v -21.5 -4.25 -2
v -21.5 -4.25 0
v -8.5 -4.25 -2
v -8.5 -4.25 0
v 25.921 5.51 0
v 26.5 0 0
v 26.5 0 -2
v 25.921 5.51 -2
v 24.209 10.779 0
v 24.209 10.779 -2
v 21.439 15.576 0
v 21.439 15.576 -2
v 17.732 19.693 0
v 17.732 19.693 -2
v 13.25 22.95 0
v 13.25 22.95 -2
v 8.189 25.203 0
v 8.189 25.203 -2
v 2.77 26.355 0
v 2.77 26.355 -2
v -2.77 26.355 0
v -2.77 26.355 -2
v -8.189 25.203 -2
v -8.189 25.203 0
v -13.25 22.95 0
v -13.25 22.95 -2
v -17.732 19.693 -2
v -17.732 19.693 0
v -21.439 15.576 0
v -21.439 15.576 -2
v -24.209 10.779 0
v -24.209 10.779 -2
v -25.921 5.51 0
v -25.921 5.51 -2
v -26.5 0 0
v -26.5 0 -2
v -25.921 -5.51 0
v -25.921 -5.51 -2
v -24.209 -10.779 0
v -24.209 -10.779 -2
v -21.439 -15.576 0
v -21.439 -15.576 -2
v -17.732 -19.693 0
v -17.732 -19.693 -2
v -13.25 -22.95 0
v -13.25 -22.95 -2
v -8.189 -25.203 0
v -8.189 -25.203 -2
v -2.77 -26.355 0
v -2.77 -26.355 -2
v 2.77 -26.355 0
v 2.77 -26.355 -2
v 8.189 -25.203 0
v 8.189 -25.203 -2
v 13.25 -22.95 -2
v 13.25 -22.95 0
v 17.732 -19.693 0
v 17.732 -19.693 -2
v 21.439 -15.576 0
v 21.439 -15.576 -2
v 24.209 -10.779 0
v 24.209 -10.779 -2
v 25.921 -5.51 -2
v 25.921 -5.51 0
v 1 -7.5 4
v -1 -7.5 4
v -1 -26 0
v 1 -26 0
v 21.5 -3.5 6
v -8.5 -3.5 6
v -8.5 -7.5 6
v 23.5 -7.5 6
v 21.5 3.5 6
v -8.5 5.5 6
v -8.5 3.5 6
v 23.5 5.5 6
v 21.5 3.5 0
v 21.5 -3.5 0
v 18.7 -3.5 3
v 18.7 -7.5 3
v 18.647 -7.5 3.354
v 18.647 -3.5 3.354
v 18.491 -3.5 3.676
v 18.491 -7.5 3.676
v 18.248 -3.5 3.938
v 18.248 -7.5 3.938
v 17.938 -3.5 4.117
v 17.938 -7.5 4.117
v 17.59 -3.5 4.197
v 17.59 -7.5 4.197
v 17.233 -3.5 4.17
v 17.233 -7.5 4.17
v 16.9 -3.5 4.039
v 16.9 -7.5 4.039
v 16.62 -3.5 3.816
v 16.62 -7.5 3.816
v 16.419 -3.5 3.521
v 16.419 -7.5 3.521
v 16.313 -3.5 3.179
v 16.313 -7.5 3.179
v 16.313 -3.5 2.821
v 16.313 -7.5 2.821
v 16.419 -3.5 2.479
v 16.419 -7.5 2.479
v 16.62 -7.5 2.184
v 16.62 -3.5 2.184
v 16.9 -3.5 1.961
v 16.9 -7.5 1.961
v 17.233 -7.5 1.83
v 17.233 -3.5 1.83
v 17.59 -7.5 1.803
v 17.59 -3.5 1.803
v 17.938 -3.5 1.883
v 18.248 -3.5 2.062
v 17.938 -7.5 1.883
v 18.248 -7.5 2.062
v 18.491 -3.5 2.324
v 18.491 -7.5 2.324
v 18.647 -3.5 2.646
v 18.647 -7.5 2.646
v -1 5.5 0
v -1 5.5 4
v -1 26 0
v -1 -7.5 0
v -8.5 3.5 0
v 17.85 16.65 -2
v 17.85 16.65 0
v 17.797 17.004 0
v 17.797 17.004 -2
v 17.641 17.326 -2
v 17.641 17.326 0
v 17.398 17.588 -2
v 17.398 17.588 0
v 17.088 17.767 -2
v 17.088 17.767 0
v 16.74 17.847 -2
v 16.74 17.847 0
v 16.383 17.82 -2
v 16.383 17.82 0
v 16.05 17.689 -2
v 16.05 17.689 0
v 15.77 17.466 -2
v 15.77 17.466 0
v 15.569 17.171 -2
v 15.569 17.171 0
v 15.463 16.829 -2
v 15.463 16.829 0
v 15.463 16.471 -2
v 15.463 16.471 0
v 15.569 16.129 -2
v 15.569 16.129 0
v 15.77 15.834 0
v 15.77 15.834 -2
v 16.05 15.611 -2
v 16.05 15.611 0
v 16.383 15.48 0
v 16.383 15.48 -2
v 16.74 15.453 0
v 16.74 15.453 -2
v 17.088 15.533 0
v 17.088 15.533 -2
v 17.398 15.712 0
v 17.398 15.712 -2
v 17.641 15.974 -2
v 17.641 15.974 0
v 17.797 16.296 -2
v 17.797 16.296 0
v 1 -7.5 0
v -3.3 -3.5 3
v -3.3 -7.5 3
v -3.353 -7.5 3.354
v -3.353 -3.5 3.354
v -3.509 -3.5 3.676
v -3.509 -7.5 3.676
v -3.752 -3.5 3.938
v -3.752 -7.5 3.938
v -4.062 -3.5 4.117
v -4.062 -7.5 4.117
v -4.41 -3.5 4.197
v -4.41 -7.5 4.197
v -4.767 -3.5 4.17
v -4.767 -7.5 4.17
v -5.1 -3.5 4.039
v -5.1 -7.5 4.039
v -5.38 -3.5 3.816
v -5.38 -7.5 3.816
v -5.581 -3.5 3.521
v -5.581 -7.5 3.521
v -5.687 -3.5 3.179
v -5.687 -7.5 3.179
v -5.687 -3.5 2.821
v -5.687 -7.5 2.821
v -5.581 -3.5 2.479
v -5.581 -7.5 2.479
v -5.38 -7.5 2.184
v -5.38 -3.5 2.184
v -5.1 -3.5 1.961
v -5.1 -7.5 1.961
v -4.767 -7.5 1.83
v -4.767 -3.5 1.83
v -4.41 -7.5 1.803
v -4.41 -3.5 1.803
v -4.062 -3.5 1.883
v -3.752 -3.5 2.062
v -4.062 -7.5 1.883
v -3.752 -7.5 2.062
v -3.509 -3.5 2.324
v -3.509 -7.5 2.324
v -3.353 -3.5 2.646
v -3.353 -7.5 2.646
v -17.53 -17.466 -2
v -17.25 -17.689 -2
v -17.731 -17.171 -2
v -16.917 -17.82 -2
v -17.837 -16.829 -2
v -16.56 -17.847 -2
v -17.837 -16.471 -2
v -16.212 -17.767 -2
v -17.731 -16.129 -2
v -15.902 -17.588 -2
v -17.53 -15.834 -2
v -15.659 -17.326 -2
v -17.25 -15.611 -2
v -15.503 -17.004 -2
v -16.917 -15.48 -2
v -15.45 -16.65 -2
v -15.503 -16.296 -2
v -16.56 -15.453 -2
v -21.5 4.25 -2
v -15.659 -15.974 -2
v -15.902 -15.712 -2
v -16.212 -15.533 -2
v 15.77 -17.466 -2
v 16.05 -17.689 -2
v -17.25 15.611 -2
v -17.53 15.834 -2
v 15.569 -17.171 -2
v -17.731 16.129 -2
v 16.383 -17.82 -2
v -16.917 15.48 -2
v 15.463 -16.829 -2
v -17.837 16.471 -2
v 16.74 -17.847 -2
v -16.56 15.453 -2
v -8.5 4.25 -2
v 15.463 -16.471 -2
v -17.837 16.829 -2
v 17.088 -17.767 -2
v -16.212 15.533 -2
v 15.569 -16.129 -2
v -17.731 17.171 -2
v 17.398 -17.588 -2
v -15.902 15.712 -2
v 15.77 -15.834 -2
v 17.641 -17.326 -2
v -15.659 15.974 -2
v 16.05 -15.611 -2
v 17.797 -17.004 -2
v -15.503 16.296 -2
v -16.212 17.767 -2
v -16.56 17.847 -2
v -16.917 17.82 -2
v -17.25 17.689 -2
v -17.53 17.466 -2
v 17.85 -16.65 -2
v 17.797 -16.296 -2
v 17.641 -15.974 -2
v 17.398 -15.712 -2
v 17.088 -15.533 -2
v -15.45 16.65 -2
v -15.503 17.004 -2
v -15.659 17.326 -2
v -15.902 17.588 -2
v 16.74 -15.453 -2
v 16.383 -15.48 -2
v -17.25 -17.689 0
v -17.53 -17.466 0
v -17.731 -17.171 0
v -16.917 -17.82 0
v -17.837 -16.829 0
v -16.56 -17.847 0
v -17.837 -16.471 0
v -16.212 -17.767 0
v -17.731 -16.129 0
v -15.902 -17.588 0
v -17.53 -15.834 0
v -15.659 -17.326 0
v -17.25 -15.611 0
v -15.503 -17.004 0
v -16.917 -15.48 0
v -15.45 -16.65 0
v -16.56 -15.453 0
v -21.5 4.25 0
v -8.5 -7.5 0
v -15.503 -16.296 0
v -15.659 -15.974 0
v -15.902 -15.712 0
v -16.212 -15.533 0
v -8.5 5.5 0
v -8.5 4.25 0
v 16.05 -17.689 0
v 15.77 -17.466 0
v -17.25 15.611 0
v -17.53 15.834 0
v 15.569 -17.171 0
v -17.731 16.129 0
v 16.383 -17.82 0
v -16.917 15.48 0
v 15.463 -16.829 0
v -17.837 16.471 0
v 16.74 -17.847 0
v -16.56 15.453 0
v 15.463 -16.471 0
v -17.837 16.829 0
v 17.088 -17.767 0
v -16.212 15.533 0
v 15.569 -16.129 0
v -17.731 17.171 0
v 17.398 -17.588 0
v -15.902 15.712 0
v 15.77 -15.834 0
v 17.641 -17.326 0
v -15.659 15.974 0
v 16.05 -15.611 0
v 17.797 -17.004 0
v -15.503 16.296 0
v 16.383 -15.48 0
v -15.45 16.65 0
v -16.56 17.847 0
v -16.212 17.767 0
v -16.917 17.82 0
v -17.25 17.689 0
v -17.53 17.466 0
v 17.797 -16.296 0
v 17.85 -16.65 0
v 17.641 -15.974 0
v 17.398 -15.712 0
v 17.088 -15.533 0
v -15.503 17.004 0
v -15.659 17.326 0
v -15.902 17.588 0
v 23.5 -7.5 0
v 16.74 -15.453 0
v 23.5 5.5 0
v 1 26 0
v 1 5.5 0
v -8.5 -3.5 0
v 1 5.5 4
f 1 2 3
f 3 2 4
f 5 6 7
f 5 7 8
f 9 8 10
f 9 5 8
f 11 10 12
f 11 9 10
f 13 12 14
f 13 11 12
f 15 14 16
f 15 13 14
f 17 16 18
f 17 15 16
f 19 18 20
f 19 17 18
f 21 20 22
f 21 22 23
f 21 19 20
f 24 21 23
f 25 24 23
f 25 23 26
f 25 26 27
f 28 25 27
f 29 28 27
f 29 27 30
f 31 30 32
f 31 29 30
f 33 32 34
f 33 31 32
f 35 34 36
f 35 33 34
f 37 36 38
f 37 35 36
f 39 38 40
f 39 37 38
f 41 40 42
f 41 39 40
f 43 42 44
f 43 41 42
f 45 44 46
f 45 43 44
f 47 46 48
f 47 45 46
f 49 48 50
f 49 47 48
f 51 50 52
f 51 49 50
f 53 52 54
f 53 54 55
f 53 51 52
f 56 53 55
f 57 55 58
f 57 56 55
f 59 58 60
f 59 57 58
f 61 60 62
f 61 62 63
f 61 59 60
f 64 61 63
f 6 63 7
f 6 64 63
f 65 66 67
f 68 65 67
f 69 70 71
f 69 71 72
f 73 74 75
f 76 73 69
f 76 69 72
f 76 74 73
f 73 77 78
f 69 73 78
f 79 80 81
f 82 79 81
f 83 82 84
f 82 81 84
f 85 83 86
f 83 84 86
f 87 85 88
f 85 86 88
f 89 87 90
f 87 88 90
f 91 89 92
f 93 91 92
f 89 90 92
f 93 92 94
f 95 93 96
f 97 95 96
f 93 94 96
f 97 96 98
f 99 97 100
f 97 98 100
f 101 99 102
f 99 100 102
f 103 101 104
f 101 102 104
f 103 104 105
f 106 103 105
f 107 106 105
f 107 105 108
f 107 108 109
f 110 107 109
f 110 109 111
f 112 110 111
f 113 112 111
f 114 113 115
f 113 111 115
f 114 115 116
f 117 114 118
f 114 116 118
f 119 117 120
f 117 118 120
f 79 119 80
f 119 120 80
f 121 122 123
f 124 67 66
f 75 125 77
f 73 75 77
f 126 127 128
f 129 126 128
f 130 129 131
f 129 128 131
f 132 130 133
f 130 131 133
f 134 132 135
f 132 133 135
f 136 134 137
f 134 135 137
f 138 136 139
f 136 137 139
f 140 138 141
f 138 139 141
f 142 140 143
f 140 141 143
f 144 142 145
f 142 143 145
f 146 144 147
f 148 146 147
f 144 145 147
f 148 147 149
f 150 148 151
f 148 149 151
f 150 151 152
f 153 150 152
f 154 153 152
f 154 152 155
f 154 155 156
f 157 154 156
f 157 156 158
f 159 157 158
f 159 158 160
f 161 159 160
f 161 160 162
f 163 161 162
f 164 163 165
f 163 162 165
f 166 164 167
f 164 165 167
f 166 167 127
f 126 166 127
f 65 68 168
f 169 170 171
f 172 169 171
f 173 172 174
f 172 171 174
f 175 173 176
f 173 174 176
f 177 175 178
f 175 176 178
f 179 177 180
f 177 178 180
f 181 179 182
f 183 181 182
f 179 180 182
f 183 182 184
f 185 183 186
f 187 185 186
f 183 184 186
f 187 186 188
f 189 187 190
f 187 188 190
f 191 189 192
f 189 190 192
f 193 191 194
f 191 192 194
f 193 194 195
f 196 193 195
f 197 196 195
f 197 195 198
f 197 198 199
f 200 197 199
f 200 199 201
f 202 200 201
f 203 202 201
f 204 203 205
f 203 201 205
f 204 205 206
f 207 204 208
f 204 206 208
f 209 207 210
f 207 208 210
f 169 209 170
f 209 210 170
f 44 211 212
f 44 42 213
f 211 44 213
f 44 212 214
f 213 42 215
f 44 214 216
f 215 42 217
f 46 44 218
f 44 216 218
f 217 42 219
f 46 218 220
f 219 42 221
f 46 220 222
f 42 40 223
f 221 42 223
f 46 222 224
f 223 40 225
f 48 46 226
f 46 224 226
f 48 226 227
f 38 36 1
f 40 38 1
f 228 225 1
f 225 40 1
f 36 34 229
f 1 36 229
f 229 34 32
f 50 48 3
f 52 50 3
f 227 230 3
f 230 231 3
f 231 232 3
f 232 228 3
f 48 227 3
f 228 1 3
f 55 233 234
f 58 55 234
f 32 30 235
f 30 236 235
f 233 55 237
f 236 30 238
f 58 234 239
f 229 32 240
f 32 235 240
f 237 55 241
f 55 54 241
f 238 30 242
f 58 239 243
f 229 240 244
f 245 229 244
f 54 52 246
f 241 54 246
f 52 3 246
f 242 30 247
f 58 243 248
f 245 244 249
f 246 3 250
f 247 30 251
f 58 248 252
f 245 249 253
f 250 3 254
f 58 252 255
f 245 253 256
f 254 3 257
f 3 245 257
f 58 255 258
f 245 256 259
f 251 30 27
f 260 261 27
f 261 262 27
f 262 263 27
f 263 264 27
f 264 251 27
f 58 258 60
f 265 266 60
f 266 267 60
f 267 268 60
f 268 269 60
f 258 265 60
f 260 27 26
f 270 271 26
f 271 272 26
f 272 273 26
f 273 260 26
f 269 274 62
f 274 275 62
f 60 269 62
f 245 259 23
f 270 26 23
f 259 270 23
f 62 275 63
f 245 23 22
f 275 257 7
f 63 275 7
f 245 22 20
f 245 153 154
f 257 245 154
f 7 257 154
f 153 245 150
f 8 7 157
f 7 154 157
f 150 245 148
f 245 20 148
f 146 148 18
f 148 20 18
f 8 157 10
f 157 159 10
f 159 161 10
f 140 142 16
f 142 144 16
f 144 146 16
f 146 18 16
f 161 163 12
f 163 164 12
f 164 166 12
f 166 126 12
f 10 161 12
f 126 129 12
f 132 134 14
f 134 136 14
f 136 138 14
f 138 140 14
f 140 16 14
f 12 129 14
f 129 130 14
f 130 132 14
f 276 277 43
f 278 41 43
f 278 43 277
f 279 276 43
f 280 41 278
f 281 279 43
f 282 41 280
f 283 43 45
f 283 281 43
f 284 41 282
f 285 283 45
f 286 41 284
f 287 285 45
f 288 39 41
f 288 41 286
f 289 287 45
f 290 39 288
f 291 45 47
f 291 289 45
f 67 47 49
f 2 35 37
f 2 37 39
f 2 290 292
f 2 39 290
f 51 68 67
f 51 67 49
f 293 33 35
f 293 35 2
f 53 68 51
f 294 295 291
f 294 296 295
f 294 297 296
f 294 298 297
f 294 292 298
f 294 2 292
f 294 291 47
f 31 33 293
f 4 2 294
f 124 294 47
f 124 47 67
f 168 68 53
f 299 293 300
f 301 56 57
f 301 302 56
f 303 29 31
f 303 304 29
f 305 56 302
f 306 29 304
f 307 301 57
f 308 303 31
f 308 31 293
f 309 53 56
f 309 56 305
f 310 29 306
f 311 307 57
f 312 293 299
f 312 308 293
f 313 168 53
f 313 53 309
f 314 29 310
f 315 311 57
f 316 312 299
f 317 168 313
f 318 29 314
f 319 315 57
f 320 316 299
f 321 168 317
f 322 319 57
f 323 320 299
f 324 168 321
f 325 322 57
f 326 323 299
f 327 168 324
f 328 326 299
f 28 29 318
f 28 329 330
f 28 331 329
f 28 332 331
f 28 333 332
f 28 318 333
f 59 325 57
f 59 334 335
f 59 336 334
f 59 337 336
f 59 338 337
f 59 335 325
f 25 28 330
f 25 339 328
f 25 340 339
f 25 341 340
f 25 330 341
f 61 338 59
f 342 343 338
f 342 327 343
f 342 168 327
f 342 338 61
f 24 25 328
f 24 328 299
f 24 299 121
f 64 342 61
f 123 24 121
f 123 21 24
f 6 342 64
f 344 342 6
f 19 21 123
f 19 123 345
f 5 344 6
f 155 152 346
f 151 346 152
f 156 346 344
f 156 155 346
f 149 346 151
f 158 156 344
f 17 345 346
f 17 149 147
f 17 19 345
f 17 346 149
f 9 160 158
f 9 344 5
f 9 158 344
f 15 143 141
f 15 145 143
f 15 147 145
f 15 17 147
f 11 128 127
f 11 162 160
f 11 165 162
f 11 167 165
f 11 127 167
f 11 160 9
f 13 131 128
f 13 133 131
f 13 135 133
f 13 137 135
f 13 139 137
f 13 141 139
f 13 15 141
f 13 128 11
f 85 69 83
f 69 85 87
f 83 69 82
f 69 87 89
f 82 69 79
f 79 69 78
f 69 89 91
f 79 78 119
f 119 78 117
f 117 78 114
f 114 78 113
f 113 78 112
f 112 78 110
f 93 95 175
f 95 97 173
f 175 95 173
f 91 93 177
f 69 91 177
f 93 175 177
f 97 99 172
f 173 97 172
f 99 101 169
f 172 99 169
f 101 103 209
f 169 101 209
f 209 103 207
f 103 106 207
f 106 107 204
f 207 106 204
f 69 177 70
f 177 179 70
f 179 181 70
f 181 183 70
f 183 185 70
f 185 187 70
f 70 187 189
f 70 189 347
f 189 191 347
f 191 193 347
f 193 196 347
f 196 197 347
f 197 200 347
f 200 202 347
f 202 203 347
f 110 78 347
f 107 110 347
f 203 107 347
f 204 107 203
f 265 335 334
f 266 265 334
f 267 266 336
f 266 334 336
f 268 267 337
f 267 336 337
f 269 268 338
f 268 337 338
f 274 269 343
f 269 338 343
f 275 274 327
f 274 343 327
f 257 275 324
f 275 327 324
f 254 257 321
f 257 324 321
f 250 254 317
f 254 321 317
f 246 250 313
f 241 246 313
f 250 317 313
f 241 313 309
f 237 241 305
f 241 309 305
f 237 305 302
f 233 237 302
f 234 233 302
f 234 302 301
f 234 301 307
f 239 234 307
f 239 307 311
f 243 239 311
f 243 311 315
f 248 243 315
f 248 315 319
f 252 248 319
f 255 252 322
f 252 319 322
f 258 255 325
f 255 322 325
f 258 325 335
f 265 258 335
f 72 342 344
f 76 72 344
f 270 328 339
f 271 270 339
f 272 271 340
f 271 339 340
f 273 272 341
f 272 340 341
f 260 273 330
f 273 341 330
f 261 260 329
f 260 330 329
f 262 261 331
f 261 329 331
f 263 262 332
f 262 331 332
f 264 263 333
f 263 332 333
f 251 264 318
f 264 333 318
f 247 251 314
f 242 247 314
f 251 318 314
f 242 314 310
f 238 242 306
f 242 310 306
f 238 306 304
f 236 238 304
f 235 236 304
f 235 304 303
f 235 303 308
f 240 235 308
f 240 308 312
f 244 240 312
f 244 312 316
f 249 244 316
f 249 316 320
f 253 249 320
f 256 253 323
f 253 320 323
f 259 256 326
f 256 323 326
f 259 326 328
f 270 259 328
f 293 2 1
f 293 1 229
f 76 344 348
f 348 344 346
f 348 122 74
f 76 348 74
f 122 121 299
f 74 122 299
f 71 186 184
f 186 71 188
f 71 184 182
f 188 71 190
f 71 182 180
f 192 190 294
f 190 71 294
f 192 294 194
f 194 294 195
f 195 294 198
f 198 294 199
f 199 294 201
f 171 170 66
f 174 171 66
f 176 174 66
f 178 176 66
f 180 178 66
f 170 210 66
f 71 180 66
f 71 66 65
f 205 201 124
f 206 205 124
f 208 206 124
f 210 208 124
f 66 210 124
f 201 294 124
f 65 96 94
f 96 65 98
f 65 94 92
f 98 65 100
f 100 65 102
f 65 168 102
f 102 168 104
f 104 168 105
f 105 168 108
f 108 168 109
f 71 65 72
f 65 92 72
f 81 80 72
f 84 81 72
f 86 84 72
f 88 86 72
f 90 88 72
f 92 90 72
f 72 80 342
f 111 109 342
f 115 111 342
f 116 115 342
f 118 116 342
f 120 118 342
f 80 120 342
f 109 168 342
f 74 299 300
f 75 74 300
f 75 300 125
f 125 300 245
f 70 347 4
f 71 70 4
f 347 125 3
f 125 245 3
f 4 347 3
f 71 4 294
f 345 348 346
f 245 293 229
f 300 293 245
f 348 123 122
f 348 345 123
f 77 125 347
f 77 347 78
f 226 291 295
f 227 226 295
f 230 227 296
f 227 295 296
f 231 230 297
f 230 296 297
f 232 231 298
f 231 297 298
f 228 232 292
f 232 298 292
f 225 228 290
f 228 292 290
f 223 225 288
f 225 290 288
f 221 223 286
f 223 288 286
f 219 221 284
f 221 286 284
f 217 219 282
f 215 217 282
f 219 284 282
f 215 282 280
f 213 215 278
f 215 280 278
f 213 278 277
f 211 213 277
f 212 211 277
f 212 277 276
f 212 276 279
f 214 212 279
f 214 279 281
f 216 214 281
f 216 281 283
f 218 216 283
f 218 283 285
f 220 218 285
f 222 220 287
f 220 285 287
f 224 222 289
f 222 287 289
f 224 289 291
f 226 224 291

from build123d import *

# Parameters (mm, degrees)
F0_R     = 26.5
F0_R_2   = 1.2
F0_W     = 13
F0_H     = 8.5
F1_DEPTH = 2
F3_DEPTH = 6
F5_DEPTH = 1
F6_R     = 1.2
F7_DEPTH = 4


with BuildPart() as f1:
    # F0 (on Top) → F1 (new body)
    with BuildSketch(Plane.XY):
        Circle(F0_R)
        with Locations((-16.65, -16.65)):
            Circle(F0_R_2, mode=Mode.SUBTRACT)
        with Locations((16.65, -16.65)):
            Circle(F0_R_2, mode=Mode.SUBTRACT)
        with Locations((-15, 0)):
            Rectangle(F0_W, F0_H, mode=Mode.SUBTRACT)
        with Locations((-16.65, 16.65)):
            Circle(F0_R_2, mode=Mode.SUBTRACT)
        with Locations((16.65, 16.65)):
            Circle(F0_R_2, mode=Mode.SUBTRACT)
    extrude(amount=-F1_DEPTH)

    # F2 (on face) → F3 (join)
    with BuildSketch(Plane.XY):
        Polygon((23.5, 5.5), (-8.5, 5.5), (-8.5, 3.5), (21.5, 3.5), (21.5, -3.5), (-8.5, -3.5), (-8.5, -7.5), (23.5, -7.5), align=None)
    extrude(amount=F3_DEPTH)

    # F4 (on Right) → F5 (join, symmetric)
    with BuildSketch(Plane.YZ):
        Polygon((-26, 0), (-7.5, 0), (-7.5, 4), align=None)
        Polygon((5.5, 4), (5.5, 0), (26, 0), align=None)
    extrude(amount=F5_DEPTH, both=True)

    # F6 (on face) → F7 (cut, through all)
    with BuildSketch(Plane.XZ.offset(7.5)):
        with Locations((-4.5, 3)):
            Circle(F6_R)
        with Locations((17.5, 3)):
            Circle(F6_R)
    extrude(amount=-F7_DEPTH, mode=Mode.SUBTRACT)


solid = f1.part
